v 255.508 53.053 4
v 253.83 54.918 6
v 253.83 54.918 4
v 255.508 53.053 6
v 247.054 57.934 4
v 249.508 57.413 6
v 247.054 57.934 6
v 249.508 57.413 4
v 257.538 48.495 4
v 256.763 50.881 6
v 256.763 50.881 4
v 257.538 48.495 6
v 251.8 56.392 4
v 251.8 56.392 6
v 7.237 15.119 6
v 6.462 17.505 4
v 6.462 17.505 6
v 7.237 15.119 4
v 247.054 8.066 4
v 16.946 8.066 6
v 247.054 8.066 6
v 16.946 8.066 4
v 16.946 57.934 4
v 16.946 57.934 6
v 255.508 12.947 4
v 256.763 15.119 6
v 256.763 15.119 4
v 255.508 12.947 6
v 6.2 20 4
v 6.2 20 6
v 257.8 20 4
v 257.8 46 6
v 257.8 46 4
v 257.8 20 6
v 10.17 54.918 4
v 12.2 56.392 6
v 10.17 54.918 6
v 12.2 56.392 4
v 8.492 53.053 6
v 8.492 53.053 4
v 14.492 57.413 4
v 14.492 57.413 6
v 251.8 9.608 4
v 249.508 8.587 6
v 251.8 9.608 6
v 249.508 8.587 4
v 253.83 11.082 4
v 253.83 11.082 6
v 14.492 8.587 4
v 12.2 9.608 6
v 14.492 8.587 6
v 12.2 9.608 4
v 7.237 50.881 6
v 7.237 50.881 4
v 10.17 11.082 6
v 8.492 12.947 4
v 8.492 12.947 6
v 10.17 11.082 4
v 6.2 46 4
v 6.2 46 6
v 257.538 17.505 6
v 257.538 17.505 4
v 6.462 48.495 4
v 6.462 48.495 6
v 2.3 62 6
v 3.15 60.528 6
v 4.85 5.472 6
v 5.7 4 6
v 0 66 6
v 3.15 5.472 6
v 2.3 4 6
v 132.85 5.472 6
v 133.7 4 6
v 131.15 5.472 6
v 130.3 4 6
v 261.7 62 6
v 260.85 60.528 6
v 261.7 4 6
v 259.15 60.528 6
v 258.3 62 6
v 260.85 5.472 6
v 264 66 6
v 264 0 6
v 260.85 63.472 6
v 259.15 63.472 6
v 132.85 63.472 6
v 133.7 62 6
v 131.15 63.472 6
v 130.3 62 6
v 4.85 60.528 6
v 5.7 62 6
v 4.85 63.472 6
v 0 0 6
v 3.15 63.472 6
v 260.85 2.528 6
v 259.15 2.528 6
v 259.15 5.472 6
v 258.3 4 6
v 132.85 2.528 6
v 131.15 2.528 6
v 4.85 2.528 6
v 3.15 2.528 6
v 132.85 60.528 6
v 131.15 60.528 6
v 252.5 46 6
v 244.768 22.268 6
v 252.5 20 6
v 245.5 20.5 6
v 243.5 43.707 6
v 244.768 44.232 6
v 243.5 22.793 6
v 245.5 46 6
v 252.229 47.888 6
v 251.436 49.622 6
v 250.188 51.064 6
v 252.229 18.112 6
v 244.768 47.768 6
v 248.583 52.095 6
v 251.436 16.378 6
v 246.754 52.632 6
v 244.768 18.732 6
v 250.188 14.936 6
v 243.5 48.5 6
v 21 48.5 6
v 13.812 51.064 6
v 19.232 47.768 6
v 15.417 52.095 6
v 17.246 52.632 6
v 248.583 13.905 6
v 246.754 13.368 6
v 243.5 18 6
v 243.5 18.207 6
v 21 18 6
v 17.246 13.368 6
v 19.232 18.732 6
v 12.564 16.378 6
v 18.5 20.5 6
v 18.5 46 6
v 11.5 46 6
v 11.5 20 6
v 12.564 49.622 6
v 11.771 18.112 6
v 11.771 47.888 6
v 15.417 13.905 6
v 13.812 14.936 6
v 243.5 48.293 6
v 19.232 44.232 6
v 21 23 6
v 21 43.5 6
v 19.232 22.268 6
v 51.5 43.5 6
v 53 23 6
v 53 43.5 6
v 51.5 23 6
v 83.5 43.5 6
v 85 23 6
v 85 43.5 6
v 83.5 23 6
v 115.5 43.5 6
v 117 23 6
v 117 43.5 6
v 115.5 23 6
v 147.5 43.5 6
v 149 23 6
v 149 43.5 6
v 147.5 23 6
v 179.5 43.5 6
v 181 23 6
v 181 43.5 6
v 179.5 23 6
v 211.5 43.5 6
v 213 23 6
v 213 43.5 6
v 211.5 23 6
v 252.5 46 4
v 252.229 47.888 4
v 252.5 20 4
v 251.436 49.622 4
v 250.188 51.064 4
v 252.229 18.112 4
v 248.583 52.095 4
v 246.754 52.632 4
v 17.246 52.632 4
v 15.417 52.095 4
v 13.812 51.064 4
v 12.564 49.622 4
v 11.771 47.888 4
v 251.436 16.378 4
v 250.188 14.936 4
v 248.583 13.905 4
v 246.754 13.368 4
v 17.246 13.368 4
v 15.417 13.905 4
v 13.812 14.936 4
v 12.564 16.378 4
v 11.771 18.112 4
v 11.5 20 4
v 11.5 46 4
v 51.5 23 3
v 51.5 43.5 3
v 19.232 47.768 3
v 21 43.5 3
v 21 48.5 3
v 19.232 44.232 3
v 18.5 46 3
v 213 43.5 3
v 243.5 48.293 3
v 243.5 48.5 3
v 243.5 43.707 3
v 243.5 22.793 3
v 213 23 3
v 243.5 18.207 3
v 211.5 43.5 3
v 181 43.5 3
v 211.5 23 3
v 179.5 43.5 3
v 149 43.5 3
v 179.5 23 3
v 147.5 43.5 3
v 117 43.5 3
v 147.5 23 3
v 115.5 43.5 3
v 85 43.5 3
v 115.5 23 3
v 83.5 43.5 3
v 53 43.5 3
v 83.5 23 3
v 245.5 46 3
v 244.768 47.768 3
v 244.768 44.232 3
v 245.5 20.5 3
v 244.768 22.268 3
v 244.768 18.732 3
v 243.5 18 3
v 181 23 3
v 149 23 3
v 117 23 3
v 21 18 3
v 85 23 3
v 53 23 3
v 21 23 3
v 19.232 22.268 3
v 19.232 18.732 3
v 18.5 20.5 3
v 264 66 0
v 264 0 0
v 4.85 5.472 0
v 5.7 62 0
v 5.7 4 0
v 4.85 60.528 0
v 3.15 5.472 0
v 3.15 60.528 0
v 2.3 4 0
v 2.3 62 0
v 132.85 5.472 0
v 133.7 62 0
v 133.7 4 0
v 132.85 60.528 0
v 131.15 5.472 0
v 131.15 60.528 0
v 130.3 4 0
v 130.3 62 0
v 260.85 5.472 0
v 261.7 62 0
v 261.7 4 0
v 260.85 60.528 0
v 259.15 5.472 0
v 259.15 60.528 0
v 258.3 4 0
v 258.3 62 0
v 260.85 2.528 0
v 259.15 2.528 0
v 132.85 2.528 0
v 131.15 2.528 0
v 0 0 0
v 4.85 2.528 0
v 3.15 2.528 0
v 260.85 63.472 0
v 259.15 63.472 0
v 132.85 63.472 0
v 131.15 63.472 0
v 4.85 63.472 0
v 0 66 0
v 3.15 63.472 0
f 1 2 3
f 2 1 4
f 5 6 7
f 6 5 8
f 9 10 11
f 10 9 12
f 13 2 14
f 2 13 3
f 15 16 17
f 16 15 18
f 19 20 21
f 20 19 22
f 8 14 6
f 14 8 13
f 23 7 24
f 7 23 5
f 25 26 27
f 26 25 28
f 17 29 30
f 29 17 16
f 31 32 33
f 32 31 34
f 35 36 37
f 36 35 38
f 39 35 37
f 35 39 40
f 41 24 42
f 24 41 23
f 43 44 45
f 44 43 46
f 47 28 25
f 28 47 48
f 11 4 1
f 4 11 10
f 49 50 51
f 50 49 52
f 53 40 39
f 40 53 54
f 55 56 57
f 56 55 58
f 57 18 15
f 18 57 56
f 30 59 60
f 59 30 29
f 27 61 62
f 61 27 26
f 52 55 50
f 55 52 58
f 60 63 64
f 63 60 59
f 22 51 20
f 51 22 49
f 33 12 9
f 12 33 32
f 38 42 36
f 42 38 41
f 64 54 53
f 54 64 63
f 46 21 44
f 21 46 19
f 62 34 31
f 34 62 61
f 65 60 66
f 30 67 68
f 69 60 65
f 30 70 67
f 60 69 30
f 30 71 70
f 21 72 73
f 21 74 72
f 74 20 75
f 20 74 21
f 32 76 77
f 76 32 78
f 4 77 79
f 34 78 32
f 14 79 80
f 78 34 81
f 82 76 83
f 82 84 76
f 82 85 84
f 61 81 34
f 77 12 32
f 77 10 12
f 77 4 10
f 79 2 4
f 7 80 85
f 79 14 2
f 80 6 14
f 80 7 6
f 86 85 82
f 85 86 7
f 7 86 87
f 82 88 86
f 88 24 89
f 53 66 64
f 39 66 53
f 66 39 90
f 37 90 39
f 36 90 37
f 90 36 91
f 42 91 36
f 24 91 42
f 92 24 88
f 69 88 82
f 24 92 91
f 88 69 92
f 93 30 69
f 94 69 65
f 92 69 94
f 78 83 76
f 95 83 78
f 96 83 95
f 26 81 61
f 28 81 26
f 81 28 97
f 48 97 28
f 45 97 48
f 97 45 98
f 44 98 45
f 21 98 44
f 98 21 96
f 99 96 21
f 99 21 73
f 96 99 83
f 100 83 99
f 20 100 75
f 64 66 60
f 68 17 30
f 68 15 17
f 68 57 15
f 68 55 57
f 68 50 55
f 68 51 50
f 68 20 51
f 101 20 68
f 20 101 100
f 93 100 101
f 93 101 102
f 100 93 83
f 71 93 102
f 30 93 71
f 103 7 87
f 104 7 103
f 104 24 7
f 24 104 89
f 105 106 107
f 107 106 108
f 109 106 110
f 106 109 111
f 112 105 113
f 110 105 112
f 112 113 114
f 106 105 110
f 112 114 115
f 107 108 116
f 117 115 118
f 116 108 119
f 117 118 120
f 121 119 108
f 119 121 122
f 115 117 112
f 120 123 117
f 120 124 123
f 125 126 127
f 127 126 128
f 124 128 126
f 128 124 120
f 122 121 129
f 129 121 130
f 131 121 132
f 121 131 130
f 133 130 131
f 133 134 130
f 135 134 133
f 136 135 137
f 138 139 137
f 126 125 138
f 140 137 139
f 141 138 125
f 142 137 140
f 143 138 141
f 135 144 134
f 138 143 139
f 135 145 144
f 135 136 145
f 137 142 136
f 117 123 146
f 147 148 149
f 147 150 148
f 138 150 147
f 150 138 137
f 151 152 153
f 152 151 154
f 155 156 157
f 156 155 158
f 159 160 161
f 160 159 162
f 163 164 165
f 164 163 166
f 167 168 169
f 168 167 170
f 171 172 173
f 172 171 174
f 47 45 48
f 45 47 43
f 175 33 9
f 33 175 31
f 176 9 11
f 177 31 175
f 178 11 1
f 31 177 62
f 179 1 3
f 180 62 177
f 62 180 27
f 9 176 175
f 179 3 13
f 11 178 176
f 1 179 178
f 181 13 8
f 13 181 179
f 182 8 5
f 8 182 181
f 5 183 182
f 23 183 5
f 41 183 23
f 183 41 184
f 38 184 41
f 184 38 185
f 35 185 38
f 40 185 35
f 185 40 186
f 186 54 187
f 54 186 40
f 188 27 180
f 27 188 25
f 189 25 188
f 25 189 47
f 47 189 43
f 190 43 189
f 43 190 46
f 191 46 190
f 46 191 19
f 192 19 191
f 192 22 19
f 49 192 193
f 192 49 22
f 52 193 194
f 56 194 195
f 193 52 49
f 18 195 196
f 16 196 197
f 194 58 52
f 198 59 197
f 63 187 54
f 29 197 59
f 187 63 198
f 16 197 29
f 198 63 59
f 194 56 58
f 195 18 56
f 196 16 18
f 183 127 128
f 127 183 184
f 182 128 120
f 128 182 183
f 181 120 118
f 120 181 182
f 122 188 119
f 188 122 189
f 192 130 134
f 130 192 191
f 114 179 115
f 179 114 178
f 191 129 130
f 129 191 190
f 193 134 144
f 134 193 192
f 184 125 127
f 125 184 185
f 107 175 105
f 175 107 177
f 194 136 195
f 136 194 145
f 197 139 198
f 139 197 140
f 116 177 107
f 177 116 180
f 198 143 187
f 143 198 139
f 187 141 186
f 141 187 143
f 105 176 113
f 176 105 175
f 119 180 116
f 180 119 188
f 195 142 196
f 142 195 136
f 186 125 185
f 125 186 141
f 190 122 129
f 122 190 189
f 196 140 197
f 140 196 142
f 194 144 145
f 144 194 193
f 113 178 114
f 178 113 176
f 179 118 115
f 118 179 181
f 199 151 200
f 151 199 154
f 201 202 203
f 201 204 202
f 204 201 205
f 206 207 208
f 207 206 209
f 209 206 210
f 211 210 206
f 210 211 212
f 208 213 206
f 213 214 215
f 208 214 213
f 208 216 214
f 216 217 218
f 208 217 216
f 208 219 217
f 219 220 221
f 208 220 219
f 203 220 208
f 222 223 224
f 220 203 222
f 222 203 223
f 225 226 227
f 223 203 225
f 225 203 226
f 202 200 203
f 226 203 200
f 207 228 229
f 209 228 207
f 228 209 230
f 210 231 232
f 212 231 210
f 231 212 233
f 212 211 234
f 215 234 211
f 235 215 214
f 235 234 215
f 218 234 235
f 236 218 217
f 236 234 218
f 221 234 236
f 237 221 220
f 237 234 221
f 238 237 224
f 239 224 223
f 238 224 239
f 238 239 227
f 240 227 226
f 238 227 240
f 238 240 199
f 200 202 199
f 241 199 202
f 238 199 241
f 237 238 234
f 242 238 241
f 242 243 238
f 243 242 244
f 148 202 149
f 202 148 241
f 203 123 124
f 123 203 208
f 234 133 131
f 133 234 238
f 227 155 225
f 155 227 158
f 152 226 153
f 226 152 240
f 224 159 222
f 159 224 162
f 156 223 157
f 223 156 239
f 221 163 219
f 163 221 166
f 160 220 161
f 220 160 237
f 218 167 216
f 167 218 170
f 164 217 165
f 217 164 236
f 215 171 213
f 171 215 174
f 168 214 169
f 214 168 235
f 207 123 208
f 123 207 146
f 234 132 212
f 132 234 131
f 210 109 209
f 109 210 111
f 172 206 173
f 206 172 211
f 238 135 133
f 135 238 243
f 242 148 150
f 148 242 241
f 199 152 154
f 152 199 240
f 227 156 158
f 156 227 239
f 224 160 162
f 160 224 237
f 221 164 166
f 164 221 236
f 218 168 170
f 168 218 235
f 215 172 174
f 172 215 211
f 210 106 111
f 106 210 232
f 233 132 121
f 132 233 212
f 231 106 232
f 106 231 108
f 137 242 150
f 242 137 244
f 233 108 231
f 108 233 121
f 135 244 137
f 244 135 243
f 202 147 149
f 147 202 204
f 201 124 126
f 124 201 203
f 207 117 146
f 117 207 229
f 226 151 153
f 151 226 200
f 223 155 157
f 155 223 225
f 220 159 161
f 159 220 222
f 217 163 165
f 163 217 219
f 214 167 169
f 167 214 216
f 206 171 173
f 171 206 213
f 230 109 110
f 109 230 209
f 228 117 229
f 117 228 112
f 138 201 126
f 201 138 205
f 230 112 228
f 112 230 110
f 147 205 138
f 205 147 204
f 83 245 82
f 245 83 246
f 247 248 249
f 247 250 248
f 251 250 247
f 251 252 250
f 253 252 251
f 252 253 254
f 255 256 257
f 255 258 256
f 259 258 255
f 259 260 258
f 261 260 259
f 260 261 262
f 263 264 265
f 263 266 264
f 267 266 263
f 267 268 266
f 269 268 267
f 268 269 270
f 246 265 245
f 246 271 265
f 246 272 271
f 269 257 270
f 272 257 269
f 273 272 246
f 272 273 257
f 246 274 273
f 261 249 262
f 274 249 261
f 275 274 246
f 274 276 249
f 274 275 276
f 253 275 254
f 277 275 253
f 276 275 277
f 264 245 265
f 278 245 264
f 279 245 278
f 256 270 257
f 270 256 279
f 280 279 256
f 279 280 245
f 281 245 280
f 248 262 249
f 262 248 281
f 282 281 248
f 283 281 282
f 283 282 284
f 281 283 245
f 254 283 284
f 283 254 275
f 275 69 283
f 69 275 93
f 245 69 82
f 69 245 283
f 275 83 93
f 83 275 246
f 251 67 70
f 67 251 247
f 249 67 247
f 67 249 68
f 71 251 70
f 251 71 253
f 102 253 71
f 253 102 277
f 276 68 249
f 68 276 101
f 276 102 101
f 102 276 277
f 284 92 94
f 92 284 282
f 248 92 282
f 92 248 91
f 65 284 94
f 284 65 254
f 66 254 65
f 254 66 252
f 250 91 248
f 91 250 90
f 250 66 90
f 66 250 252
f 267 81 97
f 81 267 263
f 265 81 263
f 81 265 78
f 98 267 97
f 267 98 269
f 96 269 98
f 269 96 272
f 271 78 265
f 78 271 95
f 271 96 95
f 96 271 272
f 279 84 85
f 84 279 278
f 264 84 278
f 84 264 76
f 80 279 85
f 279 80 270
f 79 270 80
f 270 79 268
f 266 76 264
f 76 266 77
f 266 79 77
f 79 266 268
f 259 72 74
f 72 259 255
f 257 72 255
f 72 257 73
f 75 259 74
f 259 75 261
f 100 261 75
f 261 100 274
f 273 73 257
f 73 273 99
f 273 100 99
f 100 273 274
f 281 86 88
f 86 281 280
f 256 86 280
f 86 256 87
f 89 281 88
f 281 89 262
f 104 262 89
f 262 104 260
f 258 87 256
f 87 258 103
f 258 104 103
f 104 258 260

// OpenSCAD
// Base of sealed substrate chamber for transferring samples between gloveboxes
// without exposing them to air.

// by James Ball, 22-09-2017


// base parameters
l = 264;
w = 66;
d = 6;

// substrate aperature parameters
substrate_l = 30;
substrate_w = 30;
substrate_d = 3;
substrate_tol = 0.5;
substrate_spacing = 2;
number_of_substrates = 7;
substrates_total_l = (substrate_l + substrate_spacing) * number_of_substrates - substrate_spacing;

// o-ring parameters
oring_inner_l = 241;
oring_inner_w = 39.4;
oring_outer_l = 251.6;
oring_outer_w = 50;
oring_d = 2;
oring_corner_r = 12;

// screw parameters
screw_buffer = 4;
tap_diameter = 3.4;

// drill parameters
drill_diameter = 5;

module rounded_cube(l, w, d, r){
    hull(){
        translate([r, r, 0])cylinder(h=d, r=r);
        translate([l - r, r, 0])cylinder(h=d, r=r);
        translate([r, w - r, 0])cylinder(h=d, r=r);
        translate([l - r, w - r, 0])cylinder(h=d, r=r);
    }
}

module substrates(){
    union(){
        for (x = [0 : 1 : number_of_substrates - 1])
            translate([x * (substrate_l + substrate_spacing), 0, 0])
                cube([substrate_l + substrate_tol, substrate_w + substrate_tol, substrate_d]);
        translate([-drill_diameter/2, 0, 0])rounded_cube(substrates_total_l + drill_diameter, drill_diameter, substrate_d, drill_diameter/2);
        translate([-drill_diameter/2, substrate_w + substrate_tol - drill_diameter, 0])rounded_cube(substrates_total_l + drill_diameter, drill_diameter, substrate_d, drill_diameter/2);
    }
}

module screw_tap(){
    cylinder(h=d, r=tap_diameter/2);
}

module oring(){
    difference(){
        rounded_cube(oring_outer_l, oring_outer_w, oring_d, oring_corner_r);
        translate([(oring_outer_l - oring_inner_l)/2, (oring_outer_w - oring_inner_w)/2, 0])rounded_cube(oring_inner_l, oring_inner_w, oring_d, oring_corner_r - (oring_outer_l - oring_inner_l)/2);
    }  
}
module base(){
    difference(){
        cube([l,w,d]);
        translate([(l - oring_outer_l)/2, (w - oring_outer_w)/2, d - oring_d])oring();
        translate([(l - substrates_total_l)/2, (w - substrate_w)/2, d - substrate_d])substrates();
        translate([screw_buffer, screw_buffer, 0])screw_tap();
        translate([screw_buffer, w - screw_buffer, 0])screw_tap();
        translate([l - screw_buffer, screw_buffer, 0])screw_tap();
        translate([l - screw_buffer, w - screw_buffer, 0])screw_tap();
        translate([l/2, screw_buffer, 0])screw_tap();
        translate([l/2, w - screw_buffer, 0])screw_tap();
    }
}
base();
